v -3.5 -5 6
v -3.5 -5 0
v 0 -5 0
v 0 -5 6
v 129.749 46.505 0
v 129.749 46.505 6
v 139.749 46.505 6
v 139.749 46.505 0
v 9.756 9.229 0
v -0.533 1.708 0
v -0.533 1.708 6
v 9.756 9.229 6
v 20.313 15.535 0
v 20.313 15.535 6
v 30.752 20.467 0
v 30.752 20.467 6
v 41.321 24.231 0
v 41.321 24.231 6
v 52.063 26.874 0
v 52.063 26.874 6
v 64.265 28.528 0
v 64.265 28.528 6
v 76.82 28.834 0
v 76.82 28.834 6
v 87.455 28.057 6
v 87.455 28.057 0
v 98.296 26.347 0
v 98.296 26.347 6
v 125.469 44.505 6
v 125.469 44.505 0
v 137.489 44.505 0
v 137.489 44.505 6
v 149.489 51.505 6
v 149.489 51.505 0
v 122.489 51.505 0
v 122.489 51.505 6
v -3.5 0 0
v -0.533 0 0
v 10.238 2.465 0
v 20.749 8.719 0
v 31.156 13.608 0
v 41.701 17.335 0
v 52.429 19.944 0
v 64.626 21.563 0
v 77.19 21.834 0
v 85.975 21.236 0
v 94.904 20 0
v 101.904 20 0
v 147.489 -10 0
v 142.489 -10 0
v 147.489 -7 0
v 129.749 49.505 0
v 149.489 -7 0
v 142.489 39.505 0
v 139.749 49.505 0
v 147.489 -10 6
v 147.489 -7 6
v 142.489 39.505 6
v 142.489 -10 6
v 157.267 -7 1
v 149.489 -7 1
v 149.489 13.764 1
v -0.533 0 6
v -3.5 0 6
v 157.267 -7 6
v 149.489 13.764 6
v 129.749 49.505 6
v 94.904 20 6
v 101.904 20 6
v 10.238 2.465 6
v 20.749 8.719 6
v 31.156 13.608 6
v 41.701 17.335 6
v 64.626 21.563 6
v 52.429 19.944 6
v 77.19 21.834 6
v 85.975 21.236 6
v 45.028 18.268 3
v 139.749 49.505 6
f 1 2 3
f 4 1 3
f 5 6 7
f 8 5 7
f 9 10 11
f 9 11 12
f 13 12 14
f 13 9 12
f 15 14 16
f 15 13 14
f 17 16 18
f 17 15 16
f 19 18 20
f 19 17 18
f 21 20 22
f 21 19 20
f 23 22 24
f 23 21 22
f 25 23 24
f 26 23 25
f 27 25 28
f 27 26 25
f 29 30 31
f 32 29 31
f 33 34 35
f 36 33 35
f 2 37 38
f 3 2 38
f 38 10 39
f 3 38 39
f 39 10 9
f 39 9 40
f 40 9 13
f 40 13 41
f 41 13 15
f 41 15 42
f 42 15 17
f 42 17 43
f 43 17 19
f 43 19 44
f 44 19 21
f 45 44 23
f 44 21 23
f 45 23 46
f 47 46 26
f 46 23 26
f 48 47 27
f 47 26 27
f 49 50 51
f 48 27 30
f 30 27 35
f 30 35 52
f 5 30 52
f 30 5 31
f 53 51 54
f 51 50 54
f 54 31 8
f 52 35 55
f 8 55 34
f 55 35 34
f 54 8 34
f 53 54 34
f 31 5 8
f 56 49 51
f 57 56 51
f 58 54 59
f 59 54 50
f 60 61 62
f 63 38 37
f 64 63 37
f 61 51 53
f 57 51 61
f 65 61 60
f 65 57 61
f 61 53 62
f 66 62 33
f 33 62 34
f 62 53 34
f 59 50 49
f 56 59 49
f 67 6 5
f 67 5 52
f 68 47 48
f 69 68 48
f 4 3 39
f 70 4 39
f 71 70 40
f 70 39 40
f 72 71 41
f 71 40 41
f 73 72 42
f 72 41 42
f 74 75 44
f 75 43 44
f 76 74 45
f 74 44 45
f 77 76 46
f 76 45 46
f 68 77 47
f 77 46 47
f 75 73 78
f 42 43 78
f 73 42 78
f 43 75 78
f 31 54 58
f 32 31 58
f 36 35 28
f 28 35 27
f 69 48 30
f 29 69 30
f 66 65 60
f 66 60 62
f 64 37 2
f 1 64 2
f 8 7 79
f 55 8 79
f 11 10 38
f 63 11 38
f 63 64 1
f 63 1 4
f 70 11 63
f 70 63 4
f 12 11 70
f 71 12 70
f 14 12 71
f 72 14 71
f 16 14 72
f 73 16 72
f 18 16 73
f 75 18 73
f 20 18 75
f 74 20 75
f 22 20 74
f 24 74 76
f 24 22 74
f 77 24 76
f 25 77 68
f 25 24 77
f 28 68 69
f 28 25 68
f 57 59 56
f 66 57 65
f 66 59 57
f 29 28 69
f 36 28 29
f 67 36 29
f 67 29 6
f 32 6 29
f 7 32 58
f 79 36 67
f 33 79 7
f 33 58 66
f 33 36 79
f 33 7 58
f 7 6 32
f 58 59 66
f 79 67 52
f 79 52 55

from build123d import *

# Parameters (mm, degrees)
BOSS_EXTRUDE1_DEPTH = 6
BOSS_EXTRUDE2_DEPTH = 5
CHAMFER1_SIZE       = 5
SKETCH3_W           = 10
SKETCH3_H           = 3
CUT_EXTRUDE1_DEPTH  = 6


with BuildPart() as part:
    # Sketch1 → Boss-Extrude1 (new body)
    with BuildSketch(Plane.XY):
        with BuildLine():
            Line((-0.533466094, 0), (-3.5, 0))
            Line((-3.5, 0), (-3.5, -5))
            Line((-3.5, -5), (0, -5))
            add(Edge.make_bspline(
                [(0, -5), (42.604817908, 29.035673618), (94.903787643, 20)],
                knots=[0, 0, 0, 1, 1, 1], degree=2))
            Line((94.903787643, 20), (101.903787643, 20))
            Line((101.903787643, 20), (125.469317842, 44.504980705))
            Line((125.469317842, 44.504980705), (142.489368048, 44.504980705))
            Line((142.489368048, 44.504980705), (142.489368048, -10))
            Line((142.489368048, -10), (147.489368048, -10))
            Line((147.489368048, -10), (147.489368048, -7))
            Line((147.489368048, -7), (149.489368048, -7))
            Line((149.489368048, -7), (149.489368048, 51.504980705))
            Line((149.489368048, 51.504980705), (122.489368048, 51.504980705))
            Line((122.489368048, 51.504980705), (98.295822857, 26.346948908))
            add(Edge.make_bspline(
                [(-0.533451554, 1.707670566), (28.799887609, 25.188101284), (61.717873648, 33.515524554), (98.026818716, 26.400472635), (98.295822857, 26.346948908)],
                knots=[0, 0, 0, 0, 1, 1.00745886, 1.00745886, 1.00745886, 1.00745886], degree=3))
            Line((-0.533451554, 1.707670566), (-0.533466094, 0))
        make_face()
    extrude(amount=BOSS_EXTRUDE1_DEPTH)

    # Sketch2 → Boss-Extrude2 (add)
    with BuildSketch(Plane.XY.offset(6)):
        Polygon((149.489368048, -7), (157.267488672, -7), (149.489368048, 13.763788313), align=None)
    extrude(amount=-BOSS_EXTRUDE2_DEPTH)

    # Chamfer1
    chamfer1_edges = [part.edges().sort_by_distance(p)[0] for p in [
        (142.489368048, 44.504980705, 3),
    ]]
    chamfer(chamfer1_edges, length=CHAMFER1_SIZE)

    # Sketch3 → Cut-Extrude1 (cut)
    with BuildSketch(Plane.XY.offset(6)):
        with Locations((134.74873736, 48.004980705)):
            Rectangle(SKETCH3_W, SKETCH3_H)
    extrude(amount=-CUT_EXTRUDE1_DEPTH, mode=Mode.SUBTRACT)


solid = part.part
